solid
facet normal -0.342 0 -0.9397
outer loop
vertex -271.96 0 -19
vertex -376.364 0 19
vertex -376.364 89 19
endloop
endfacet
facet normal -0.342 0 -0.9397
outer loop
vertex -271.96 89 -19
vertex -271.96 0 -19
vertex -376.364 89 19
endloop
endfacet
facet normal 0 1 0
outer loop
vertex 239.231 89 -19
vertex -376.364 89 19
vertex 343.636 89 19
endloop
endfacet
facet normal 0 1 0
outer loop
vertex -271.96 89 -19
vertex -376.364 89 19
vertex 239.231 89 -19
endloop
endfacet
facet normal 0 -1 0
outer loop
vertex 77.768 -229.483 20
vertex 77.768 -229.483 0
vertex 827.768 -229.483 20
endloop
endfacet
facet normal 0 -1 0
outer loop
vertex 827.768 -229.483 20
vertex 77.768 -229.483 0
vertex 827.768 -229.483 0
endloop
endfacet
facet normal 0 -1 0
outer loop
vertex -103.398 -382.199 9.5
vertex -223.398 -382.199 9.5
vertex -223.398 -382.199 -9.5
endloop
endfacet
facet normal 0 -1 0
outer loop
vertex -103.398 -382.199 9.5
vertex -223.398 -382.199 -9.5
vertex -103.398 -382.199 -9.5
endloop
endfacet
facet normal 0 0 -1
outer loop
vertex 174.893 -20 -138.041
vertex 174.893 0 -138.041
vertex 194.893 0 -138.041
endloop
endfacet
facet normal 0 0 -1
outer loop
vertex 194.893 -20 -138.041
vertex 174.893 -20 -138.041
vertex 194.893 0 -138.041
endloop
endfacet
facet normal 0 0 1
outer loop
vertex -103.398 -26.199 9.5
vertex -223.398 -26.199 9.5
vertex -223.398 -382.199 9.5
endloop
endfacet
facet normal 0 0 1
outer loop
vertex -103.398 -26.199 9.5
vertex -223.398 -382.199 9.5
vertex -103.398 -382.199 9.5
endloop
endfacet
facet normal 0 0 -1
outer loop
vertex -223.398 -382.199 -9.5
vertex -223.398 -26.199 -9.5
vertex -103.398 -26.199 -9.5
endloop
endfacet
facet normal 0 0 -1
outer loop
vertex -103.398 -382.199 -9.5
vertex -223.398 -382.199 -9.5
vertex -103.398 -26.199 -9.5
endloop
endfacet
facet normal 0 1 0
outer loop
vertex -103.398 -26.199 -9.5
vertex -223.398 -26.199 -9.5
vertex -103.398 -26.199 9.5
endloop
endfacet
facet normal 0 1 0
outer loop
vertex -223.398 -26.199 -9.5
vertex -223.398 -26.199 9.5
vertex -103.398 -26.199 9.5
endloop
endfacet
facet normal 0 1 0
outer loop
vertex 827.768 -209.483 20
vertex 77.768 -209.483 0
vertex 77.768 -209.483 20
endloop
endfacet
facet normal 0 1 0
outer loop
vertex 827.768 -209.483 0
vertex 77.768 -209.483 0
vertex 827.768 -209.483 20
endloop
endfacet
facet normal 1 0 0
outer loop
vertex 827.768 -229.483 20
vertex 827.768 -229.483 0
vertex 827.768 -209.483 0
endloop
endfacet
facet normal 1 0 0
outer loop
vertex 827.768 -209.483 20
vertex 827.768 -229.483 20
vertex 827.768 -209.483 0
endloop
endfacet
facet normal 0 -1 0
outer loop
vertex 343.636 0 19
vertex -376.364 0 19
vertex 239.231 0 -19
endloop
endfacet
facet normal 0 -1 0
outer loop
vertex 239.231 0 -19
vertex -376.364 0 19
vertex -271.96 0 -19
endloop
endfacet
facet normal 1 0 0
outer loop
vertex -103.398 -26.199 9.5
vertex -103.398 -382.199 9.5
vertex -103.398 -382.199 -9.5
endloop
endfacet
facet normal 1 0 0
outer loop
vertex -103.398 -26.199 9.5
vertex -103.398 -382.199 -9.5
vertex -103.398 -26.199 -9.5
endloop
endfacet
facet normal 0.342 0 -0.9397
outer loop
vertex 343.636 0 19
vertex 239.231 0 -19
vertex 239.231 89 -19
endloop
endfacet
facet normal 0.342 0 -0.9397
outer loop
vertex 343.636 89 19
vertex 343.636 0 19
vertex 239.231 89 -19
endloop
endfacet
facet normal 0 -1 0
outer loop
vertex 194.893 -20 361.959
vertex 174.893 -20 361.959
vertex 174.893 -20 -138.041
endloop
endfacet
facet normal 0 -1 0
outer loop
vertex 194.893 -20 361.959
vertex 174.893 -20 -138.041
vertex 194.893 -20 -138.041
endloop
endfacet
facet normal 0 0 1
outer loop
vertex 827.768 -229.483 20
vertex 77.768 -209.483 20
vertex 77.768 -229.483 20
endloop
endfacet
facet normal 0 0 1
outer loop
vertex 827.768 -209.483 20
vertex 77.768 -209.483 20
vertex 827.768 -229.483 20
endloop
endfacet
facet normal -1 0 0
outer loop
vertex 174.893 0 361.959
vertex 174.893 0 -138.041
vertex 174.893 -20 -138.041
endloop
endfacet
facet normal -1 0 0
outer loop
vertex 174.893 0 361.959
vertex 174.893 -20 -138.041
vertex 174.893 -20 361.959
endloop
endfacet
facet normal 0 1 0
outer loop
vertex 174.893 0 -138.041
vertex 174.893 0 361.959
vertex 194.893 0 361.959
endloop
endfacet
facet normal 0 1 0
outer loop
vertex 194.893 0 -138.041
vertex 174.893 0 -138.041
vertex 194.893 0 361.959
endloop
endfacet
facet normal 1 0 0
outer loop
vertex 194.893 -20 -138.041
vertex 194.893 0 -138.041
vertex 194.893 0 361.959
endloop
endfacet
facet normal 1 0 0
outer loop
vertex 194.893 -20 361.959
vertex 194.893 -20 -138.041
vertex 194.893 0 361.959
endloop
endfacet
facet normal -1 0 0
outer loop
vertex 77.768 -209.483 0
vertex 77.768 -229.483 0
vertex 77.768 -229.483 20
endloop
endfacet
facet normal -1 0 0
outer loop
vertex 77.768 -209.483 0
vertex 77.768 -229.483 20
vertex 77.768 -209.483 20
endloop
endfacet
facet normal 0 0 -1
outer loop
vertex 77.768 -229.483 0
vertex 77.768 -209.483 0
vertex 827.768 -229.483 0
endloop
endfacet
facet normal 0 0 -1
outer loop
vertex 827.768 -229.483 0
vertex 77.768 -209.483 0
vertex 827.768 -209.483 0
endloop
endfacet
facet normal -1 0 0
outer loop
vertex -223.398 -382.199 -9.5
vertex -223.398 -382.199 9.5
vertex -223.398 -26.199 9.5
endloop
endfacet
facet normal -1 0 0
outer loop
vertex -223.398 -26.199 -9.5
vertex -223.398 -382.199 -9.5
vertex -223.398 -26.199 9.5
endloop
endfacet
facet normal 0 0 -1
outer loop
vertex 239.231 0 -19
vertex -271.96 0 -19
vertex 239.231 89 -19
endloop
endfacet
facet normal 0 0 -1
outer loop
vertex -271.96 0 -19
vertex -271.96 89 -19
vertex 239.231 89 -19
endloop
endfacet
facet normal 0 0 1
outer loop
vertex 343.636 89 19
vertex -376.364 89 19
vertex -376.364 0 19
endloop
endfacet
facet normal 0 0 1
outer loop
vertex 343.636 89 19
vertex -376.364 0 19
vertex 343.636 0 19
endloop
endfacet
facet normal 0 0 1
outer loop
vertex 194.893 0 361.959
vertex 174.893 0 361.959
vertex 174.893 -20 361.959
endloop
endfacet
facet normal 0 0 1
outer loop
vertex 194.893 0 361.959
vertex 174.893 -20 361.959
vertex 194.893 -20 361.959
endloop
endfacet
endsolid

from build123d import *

# Parameters (mm, degrees)
F0_W       = 720
F0_H       = 89
F1_DEPTH   = 19
F2_W       = 120
F2_H       = 356
F3_DEPTH   = 9.5
F4_SIZE2   = 104.404132
F4_SIZE    = 37.99999
F4_2_SIZE2 = 104.404132
F4_2_SIZE  = 37.99999
F5_W       = 20
F5_H       = 500
F6_DEPTH   = 20
F7_W       = 750
F7_H       = 20
F8_DEPTH   = 20


# Not quite as in the source:
# - a fillet or chamfer is up to 0.001 mm smaller than in the source, because OpenCascade refuses the exact size


with BuildPart() as f1:
    # F0 (on Top) → F1 (new body, symmetric)
    with BuildSketch(Plane.XY):
        with Locations((-16.3644044673, 44.5)):
            Rectangle(F0_W, F0_H)
    extrude(amount=F1_DEPTH, both=True)

    # F4 (size 38 and 104.4041419393 in the source; OpenCascade refuses exactly that, so slightly less here)
    f4_edges = [f1.edges().sort_by_distance(p)[0] for p in [
        (-376.364404, 44.5, -19),
    ]]
    f4_side = f1.faces().sort_by_distance((-376.364404, 44.5, 0))[0]
    chamfer(f4_edges, length=F4_SIZE, length2=F4_SIZE2, reference=f4_side)

    # F4#2 (size 38 and 104.4041419393 in the source; OpenCascade refuses exactly that, so slightly less here)
    f4_2_edges = [f1.edges().sort_by_distance(p)[0] for p in [
        (343.635596, 44.5, -19),
    ]]
    f4_2_side = f1.faces().sort_by_distance((343.635596, 44.5, 0))[0]
    chamfer(f4_2_edges, length=F4_2_SIZE, length2=F4_2_SIZE2, reference=f4_2_side)


with BuildPart() as f3:
    # F2 (on Top) → F3 (new body, symmetric)
    with BuildSketch(Plane.XY):
        with Locations((-163.3983030915, -204.1987112857)):
            Rectangle(F2_W, F2_H)
    extrude(amount=F3_DEPTH, both=True)


with BuildPart() as f6:
    # F5 (on Front) → F6 (new body)
    with BuildSketch(Plane.XZ):
        with Locations((184.8932749033, 111.9590550661)):
            Rectangle(F5_W, F5_H)
    extrude(amount=F6_DEPTH)


with BuildPart() as f8:
    # F7 (on Top) → F8 (new body)
    with BuildSketch(Plane.XY):
        with Locations((452.7677640198, -219.4832157493)):
            Rectangle(F7_W, F7_H)
    extrude(amount=F8_DEPTH)


solid = Compound([f1.part, f3.part, f6.part, f8.part])
